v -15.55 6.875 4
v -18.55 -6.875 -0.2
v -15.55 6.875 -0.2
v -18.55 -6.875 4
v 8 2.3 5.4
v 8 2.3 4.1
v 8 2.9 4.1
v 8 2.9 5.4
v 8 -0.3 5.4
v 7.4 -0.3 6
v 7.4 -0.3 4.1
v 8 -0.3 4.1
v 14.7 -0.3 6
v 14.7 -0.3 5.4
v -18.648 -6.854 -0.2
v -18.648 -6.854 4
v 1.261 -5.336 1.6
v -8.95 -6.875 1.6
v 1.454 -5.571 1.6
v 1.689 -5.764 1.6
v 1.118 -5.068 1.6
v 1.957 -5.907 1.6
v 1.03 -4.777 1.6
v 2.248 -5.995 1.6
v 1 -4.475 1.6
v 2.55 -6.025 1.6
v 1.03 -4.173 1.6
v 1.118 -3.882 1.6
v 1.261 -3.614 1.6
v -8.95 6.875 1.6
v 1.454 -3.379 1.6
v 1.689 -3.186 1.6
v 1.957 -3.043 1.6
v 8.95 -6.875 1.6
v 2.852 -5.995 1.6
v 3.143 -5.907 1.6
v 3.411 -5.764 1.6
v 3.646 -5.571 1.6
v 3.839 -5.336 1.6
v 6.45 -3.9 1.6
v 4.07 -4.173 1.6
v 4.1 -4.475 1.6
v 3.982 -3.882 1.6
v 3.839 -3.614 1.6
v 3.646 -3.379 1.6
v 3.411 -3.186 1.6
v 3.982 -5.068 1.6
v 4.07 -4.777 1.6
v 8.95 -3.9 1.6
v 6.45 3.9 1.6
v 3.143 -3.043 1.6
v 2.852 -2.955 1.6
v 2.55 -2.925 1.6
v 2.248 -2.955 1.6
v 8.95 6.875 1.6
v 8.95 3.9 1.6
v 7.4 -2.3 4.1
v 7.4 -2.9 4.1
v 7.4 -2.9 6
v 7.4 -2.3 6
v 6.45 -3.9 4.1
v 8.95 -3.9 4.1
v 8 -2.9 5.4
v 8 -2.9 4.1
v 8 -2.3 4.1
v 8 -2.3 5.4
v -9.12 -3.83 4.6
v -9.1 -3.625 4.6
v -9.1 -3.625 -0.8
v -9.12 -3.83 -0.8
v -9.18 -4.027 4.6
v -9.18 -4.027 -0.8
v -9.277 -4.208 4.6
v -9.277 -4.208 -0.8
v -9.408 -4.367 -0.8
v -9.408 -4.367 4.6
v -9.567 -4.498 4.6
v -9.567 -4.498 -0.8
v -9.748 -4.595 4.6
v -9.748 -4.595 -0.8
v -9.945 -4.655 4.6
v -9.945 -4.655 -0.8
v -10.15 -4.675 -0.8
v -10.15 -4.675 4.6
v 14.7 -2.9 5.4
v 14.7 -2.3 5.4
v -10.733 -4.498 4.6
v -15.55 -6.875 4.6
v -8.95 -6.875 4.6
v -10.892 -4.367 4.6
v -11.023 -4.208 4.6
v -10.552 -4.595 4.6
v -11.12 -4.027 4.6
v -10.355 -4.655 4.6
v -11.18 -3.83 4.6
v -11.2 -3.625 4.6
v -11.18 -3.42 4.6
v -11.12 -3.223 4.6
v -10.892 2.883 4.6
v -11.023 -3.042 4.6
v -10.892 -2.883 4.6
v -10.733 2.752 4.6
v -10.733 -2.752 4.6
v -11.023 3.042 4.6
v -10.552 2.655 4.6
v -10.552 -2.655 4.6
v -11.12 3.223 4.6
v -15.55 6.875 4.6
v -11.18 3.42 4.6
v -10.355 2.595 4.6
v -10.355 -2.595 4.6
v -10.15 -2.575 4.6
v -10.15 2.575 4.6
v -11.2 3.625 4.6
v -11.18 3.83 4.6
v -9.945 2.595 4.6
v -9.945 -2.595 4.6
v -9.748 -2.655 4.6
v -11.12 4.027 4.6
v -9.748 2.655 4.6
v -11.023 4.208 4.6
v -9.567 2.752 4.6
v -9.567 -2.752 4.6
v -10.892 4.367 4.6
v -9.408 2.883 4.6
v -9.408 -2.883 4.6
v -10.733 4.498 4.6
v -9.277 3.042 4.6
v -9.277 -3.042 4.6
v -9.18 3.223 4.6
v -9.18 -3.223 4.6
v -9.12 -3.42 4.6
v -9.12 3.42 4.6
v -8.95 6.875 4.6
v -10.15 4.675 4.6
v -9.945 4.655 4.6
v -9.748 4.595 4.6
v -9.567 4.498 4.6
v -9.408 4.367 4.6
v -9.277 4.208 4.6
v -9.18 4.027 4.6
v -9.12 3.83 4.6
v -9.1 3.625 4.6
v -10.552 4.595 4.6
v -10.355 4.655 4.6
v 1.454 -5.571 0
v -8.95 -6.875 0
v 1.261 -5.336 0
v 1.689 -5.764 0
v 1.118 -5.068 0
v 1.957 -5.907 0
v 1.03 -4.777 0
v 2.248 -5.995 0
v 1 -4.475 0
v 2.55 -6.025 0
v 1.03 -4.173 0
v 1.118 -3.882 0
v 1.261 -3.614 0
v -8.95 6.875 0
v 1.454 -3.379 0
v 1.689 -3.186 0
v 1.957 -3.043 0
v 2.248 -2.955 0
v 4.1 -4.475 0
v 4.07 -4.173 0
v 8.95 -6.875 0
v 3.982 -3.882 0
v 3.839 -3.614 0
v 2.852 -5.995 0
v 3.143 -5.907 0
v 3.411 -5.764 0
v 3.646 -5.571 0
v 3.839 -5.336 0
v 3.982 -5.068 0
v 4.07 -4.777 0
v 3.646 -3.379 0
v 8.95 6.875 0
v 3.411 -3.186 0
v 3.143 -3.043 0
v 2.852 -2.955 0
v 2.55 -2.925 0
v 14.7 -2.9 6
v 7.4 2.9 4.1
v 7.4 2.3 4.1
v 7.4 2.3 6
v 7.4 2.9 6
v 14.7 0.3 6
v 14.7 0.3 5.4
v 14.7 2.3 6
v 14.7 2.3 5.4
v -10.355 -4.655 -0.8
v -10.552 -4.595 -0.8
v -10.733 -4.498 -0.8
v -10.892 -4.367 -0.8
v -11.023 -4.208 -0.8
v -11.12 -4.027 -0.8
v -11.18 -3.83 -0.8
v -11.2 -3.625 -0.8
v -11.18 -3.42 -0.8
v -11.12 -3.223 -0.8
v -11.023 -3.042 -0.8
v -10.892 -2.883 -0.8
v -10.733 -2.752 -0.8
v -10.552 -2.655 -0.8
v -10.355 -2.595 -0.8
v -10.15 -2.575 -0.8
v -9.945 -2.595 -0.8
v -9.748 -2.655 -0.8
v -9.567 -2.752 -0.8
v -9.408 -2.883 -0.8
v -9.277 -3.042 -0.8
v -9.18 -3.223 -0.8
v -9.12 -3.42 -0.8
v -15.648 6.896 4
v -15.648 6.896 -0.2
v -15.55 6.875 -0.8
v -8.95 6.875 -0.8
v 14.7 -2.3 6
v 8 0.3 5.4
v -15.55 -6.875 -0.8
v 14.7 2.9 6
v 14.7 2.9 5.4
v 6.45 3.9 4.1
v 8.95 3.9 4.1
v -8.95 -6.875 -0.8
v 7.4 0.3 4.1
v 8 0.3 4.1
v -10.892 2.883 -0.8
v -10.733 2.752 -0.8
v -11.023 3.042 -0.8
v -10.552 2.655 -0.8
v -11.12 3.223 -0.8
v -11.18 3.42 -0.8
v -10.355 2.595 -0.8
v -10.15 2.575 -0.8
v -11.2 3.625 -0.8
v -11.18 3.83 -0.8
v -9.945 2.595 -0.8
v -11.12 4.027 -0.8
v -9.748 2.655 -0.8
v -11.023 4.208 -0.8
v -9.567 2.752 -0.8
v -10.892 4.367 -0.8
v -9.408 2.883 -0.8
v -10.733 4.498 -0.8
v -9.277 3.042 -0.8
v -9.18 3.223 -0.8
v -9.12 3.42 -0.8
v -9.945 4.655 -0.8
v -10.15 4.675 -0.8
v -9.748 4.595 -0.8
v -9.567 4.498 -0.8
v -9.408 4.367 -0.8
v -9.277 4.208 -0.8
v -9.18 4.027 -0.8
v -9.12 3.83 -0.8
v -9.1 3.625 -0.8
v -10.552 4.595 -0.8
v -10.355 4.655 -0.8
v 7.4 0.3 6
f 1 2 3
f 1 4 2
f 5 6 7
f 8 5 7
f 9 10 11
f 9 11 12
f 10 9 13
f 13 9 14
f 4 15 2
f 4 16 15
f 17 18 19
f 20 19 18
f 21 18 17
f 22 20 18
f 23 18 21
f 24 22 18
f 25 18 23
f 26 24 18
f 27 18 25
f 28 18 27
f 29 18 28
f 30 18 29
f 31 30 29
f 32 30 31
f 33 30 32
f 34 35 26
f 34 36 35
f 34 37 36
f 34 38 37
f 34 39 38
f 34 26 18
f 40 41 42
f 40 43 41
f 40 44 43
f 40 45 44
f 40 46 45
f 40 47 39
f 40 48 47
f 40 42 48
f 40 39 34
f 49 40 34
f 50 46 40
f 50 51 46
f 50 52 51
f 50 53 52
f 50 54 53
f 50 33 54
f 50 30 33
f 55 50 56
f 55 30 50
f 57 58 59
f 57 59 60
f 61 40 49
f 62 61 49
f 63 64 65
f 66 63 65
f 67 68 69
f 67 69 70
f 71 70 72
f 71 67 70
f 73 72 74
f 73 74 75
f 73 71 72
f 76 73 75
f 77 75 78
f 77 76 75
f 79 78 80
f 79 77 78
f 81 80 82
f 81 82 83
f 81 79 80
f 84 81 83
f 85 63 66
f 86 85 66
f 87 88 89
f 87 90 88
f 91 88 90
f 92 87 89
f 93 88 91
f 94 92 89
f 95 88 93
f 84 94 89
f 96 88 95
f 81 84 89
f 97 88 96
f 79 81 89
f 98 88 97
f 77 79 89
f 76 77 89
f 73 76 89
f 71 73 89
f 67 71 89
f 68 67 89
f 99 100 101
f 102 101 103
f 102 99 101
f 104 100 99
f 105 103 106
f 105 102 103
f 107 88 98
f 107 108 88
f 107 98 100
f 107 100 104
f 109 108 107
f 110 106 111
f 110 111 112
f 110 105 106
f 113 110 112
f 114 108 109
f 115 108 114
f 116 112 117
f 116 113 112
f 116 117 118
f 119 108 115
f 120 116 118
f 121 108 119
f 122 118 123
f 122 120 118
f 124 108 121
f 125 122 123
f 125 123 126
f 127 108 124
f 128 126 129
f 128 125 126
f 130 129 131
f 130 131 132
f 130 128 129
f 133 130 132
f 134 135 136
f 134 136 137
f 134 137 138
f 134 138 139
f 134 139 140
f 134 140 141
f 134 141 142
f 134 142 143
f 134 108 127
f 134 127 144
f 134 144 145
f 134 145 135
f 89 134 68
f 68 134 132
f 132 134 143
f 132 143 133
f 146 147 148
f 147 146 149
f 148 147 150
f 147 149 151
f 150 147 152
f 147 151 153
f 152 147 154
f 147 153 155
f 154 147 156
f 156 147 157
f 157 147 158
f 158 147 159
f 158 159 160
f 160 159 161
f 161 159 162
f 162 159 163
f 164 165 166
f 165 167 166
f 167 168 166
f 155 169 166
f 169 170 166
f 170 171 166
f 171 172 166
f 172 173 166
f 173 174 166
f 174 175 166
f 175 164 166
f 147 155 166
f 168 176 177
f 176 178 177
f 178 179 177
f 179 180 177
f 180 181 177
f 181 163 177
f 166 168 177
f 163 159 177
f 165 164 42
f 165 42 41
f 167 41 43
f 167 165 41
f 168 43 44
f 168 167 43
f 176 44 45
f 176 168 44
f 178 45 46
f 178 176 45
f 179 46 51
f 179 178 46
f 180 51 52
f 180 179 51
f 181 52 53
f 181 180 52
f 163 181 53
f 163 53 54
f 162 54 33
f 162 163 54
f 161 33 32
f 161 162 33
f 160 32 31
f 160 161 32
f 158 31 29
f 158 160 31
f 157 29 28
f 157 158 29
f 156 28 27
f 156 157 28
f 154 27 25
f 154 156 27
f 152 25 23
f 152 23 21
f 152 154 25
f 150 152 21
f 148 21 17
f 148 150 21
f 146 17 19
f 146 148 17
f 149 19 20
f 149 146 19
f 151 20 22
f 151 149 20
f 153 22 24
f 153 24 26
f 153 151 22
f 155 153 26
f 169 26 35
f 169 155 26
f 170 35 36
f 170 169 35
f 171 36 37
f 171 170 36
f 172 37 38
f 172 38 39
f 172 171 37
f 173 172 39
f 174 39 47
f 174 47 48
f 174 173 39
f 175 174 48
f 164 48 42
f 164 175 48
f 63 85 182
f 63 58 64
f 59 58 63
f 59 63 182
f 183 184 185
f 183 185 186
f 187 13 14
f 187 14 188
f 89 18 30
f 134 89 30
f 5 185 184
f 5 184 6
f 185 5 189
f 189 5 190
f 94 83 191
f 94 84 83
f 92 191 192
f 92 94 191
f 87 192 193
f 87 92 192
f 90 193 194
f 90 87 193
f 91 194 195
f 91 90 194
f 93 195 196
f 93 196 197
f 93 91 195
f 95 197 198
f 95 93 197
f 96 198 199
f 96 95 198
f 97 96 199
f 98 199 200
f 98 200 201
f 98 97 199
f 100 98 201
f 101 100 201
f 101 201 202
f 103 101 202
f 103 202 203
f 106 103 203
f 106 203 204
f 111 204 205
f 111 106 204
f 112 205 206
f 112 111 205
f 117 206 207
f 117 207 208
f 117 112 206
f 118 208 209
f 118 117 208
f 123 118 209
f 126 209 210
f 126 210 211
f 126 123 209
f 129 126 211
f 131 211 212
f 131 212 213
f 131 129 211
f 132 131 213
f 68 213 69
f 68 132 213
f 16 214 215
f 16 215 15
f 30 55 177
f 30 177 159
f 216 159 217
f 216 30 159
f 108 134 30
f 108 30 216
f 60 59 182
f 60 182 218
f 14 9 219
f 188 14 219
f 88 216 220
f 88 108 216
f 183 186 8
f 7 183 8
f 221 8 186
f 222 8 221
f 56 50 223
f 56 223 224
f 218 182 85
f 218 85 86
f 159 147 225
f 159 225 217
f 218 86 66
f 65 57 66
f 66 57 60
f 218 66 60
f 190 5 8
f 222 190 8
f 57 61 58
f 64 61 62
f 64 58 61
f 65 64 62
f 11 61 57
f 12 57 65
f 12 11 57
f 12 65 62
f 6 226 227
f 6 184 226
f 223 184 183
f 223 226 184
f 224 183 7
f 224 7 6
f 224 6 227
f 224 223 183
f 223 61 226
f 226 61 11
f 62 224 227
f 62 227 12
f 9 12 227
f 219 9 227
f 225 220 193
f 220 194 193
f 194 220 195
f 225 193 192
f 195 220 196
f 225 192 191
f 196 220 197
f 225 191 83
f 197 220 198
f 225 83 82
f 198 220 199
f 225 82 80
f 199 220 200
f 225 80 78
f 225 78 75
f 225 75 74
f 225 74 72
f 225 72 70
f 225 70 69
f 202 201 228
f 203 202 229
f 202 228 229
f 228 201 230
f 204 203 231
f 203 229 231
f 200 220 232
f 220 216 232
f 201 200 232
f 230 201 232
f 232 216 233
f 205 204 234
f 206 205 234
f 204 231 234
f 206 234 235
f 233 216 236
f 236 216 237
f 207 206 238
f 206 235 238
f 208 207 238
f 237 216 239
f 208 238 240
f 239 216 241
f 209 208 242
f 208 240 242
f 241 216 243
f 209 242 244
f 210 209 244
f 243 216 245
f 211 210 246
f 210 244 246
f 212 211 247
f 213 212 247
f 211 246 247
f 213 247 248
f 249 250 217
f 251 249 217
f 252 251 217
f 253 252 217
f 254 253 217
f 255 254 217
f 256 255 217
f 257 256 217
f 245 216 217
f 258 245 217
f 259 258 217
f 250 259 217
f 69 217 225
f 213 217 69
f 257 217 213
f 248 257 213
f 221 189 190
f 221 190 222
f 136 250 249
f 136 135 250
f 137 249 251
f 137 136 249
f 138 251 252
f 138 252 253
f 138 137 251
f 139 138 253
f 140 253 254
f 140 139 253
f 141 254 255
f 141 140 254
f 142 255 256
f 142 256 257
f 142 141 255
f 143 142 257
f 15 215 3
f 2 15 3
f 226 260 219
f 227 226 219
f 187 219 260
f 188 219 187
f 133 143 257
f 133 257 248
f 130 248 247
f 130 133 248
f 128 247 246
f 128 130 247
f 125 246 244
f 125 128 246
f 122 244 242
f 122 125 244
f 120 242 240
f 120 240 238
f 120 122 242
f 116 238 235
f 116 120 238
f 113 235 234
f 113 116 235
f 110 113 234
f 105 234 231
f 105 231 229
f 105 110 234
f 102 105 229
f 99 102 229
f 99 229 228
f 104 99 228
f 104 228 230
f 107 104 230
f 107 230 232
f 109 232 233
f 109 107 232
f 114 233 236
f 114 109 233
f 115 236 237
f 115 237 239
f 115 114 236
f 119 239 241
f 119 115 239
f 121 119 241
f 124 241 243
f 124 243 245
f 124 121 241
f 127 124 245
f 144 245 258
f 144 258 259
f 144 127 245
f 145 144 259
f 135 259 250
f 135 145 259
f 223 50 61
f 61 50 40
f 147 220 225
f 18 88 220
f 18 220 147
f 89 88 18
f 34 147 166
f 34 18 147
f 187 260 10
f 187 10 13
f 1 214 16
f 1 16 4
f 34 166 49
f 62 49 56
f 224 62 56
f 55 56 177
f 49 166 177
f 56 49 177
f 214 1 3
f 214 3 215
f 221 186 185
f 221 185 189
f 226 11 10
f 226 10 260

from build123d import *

# Parameters (mm, degrees)
F0_R          = 1.55
F0_W          = 2.5
F0_H          = 2.6
F0_W_2        = 0.6
F0_H_2        = 0.6
F1_DEPTH      = 1.6
F2_DEPTH      = 4.1
F3_DEPTH      = 6
F4_W          = 0.6
F4_H          = 0.6
F5_DEPTH      = 6.7
F6_DEPTH      = 4.6
F7_DEPTH      = 0.8
F8_DEPTH      = 4
F8_DEPTH_BACK = 0.2


with BuildPart() as f1:
    # F0 (on Top) → F1 (new body)
    with BuildSketch(Plane.XY):
        Polygon((-8.95, -6.875), (8.95, -6.875), (8.95, -3.9), (6.45, -3.9), (6.45, -1.3), (6.45, 1.3), (6.45, 3.9), (8.95, 3.9), (8.95, 6.875), (-8.95, 6.875), (-8.95, 4.675), (-8.95, -4.675), align=None)
        with Locations((2.55, -4.475)):
            Circle(F0_R, mode=Mode.SUBTRACT)
        with Locations((7.7, 2.6)):
            Rectangle(F0_W, F0_H)
        with Locations((7.7, 2.6)):
            Rectangle(F0_W_2, F0_H_2, mode=Mode.SUBTRACT)
        with Locations((7.7, 0)):
            Rectangle(F0_W, F0_H)
        with Locations((7.7, 0)):
            Rectangle(F0_W_2, F0_H_2, mode=Mode.SUBTRACT)
        with Locations((7.7, 2.6)):
            Rectangle(F0_W_2, F0_H_2)
        with Locations((7.7, 0)):
            Rectangle(F0_W_2, F0_H_2)
        with Locations((7.7, -2.6)):
            Rectangle(F0_W, F0_H)
        with Locations((7.7, -2.6)):
            Rectangle(F0_W_2, F0_H_2, mode=Mode.SUBTRACT)
        with Locations((7.7, -2.6)):
            Rectangle(F0_W_2, F0_H_2)
    extrude(amount=F1_DEPTH)

    # F0 (on Top) → F2 (join)
    with BuildSketch(Plane.XY):
        with Locations((7.7, 2.6)):
            Rectangle(F0_W_2, F0_H_2)
        with Locations((7.7, 2.6)):
            Rectangle(F0_W, F0_H)
        with Locations((7.7, 2.6)):
            Rectangle(F0_W_2, F0_H_2, mode=Mode.SUBTRACT)
        with Locations((7.7, 0)):
            Rectangle(F0_W_2, F0_H_2)
        with Locations((7.7, 0)):
            Rectangle(F0_W, F0_H)
        with Locations((7.7, 0)):
            Rectangle(F0_W_2, F0_H_2, mode=Mode.SUBTRACT)
        with Locations((7.7, -2.6)):
            Rectangle(F0_W_2, F0_H_2)
        with Locations((7.7, -2.6)):
            Rectangle(F0_W, F0_H)
        with Locations((7.7, -2.6)):
            Rectangle(F0_W_2, F0_H_2, mode=Mode.SUBTRACT)
    extrude(amount=F2_DEPTH)

    # F0 (on Top) → F3 (join)
    with BuildSketch(Plane.XY):
        with Locations((7.7, -2.6)):
            Rectangle(F0_W_2, F0_H_2)
        with Locations((7.7, 0)):
            Rectangle(F0_W_2, F0_H_2)
        with Locations((7.7, 2.6)):
            Rectangle(F0_W_2, F0_H_2)
    extrude(amount=F3_DEPTH)

    # F4 (on face) → F5 (join)
    with BuildSketch(Plane.YZ.offset(8)):
        with Locations((-2.6, 5.7)):
            Rectangle(F4_W, F4_H)
        with Locations((0, 5.7)):
            Rectangle(F4_W, F4_H)
        with Locations((2.6, 5.7)):
            Rectangle(F4_W, F4_H)
    extrude(amount=F5_DEPTH)

    # F0 (on Top) → F6 (join)
    with BuildSketch(Plane.XY):
        Polygon((-15.55, -6.875), (-8.95, -6.875), (-8.95, -4.675), (-8.95, 4.675), (-8.95, 6.875), (-15.55, 6.875), align=None)
        with BuildLine():
            ThreePointArc((-9.1, -3.625), (-9.407538, -4.367462), (-10.15, -4.675))
            ThreePointArc((-10.15, -4.675), (-10.892462, -2.882538), (-9.1, -3.625))
        make_face(mode=Mode.SUBTRACT)
        with BuildLine():
            ThreePointArc((-9.1, 3.625), (-10.892462, 2.882538), (-10.15, 4.675))
            ThreePointArc((-10.15, 4.675), (-9.407538, 4.367462), (-9.1, 3.625))
        make_face(mode=Mode.SUBTRACT)
    extrude(amount=F6_DEPTH)

    # F0 (on Top) → F7 (join)
    with BuildSketch(Plane.XY):
        Polygon((-15.55, -6.875), (-8.95, -6.875), (-8.95, -4.675), (-8.95, 4.675), (-8.95, 6.875), (-15.55, 6.875), align=None)
        with BuildLine():
            ThreePointArc((-9.1, -3.625), (-9.407538, -4.367462), (-10.15, -4.675))
            ThreePointArc((-10.15, -4.675), (-10.892462, -2.882538), (-9.1, -3.625))
        make_face(mode=Mode.SUBTRACT)
        with BuildLine():
            ThreePointArc((-9.1, 3.625), (-10.892462, 2.882538), (-10.15, 4.675))
            ThreePointArc((-10.15, 4.675), (-9.407538, 4.367462), (-9.1, 3.625))
        make_face(mode=Mode.SUBTRACT)
    extrude(amount=-F7_DEPTH)


with BuildPart() as f8:
    # F0 (on Top) → F8 (new body, two sides)
    with BuildSketch(Plane.XY) as f8_sk:
        Polygon((-18.55, -6.875), (-15.55, 6.875), (-15.647702, 6.896317), (-18.647702, -6.853683), align=None)
    extrude(amount=F8_DEPTH)
    extrude(f8_sk.sketch, amount=-F8_DEPTH_BACK)


solid = Compound([f1.part, f8.part])
